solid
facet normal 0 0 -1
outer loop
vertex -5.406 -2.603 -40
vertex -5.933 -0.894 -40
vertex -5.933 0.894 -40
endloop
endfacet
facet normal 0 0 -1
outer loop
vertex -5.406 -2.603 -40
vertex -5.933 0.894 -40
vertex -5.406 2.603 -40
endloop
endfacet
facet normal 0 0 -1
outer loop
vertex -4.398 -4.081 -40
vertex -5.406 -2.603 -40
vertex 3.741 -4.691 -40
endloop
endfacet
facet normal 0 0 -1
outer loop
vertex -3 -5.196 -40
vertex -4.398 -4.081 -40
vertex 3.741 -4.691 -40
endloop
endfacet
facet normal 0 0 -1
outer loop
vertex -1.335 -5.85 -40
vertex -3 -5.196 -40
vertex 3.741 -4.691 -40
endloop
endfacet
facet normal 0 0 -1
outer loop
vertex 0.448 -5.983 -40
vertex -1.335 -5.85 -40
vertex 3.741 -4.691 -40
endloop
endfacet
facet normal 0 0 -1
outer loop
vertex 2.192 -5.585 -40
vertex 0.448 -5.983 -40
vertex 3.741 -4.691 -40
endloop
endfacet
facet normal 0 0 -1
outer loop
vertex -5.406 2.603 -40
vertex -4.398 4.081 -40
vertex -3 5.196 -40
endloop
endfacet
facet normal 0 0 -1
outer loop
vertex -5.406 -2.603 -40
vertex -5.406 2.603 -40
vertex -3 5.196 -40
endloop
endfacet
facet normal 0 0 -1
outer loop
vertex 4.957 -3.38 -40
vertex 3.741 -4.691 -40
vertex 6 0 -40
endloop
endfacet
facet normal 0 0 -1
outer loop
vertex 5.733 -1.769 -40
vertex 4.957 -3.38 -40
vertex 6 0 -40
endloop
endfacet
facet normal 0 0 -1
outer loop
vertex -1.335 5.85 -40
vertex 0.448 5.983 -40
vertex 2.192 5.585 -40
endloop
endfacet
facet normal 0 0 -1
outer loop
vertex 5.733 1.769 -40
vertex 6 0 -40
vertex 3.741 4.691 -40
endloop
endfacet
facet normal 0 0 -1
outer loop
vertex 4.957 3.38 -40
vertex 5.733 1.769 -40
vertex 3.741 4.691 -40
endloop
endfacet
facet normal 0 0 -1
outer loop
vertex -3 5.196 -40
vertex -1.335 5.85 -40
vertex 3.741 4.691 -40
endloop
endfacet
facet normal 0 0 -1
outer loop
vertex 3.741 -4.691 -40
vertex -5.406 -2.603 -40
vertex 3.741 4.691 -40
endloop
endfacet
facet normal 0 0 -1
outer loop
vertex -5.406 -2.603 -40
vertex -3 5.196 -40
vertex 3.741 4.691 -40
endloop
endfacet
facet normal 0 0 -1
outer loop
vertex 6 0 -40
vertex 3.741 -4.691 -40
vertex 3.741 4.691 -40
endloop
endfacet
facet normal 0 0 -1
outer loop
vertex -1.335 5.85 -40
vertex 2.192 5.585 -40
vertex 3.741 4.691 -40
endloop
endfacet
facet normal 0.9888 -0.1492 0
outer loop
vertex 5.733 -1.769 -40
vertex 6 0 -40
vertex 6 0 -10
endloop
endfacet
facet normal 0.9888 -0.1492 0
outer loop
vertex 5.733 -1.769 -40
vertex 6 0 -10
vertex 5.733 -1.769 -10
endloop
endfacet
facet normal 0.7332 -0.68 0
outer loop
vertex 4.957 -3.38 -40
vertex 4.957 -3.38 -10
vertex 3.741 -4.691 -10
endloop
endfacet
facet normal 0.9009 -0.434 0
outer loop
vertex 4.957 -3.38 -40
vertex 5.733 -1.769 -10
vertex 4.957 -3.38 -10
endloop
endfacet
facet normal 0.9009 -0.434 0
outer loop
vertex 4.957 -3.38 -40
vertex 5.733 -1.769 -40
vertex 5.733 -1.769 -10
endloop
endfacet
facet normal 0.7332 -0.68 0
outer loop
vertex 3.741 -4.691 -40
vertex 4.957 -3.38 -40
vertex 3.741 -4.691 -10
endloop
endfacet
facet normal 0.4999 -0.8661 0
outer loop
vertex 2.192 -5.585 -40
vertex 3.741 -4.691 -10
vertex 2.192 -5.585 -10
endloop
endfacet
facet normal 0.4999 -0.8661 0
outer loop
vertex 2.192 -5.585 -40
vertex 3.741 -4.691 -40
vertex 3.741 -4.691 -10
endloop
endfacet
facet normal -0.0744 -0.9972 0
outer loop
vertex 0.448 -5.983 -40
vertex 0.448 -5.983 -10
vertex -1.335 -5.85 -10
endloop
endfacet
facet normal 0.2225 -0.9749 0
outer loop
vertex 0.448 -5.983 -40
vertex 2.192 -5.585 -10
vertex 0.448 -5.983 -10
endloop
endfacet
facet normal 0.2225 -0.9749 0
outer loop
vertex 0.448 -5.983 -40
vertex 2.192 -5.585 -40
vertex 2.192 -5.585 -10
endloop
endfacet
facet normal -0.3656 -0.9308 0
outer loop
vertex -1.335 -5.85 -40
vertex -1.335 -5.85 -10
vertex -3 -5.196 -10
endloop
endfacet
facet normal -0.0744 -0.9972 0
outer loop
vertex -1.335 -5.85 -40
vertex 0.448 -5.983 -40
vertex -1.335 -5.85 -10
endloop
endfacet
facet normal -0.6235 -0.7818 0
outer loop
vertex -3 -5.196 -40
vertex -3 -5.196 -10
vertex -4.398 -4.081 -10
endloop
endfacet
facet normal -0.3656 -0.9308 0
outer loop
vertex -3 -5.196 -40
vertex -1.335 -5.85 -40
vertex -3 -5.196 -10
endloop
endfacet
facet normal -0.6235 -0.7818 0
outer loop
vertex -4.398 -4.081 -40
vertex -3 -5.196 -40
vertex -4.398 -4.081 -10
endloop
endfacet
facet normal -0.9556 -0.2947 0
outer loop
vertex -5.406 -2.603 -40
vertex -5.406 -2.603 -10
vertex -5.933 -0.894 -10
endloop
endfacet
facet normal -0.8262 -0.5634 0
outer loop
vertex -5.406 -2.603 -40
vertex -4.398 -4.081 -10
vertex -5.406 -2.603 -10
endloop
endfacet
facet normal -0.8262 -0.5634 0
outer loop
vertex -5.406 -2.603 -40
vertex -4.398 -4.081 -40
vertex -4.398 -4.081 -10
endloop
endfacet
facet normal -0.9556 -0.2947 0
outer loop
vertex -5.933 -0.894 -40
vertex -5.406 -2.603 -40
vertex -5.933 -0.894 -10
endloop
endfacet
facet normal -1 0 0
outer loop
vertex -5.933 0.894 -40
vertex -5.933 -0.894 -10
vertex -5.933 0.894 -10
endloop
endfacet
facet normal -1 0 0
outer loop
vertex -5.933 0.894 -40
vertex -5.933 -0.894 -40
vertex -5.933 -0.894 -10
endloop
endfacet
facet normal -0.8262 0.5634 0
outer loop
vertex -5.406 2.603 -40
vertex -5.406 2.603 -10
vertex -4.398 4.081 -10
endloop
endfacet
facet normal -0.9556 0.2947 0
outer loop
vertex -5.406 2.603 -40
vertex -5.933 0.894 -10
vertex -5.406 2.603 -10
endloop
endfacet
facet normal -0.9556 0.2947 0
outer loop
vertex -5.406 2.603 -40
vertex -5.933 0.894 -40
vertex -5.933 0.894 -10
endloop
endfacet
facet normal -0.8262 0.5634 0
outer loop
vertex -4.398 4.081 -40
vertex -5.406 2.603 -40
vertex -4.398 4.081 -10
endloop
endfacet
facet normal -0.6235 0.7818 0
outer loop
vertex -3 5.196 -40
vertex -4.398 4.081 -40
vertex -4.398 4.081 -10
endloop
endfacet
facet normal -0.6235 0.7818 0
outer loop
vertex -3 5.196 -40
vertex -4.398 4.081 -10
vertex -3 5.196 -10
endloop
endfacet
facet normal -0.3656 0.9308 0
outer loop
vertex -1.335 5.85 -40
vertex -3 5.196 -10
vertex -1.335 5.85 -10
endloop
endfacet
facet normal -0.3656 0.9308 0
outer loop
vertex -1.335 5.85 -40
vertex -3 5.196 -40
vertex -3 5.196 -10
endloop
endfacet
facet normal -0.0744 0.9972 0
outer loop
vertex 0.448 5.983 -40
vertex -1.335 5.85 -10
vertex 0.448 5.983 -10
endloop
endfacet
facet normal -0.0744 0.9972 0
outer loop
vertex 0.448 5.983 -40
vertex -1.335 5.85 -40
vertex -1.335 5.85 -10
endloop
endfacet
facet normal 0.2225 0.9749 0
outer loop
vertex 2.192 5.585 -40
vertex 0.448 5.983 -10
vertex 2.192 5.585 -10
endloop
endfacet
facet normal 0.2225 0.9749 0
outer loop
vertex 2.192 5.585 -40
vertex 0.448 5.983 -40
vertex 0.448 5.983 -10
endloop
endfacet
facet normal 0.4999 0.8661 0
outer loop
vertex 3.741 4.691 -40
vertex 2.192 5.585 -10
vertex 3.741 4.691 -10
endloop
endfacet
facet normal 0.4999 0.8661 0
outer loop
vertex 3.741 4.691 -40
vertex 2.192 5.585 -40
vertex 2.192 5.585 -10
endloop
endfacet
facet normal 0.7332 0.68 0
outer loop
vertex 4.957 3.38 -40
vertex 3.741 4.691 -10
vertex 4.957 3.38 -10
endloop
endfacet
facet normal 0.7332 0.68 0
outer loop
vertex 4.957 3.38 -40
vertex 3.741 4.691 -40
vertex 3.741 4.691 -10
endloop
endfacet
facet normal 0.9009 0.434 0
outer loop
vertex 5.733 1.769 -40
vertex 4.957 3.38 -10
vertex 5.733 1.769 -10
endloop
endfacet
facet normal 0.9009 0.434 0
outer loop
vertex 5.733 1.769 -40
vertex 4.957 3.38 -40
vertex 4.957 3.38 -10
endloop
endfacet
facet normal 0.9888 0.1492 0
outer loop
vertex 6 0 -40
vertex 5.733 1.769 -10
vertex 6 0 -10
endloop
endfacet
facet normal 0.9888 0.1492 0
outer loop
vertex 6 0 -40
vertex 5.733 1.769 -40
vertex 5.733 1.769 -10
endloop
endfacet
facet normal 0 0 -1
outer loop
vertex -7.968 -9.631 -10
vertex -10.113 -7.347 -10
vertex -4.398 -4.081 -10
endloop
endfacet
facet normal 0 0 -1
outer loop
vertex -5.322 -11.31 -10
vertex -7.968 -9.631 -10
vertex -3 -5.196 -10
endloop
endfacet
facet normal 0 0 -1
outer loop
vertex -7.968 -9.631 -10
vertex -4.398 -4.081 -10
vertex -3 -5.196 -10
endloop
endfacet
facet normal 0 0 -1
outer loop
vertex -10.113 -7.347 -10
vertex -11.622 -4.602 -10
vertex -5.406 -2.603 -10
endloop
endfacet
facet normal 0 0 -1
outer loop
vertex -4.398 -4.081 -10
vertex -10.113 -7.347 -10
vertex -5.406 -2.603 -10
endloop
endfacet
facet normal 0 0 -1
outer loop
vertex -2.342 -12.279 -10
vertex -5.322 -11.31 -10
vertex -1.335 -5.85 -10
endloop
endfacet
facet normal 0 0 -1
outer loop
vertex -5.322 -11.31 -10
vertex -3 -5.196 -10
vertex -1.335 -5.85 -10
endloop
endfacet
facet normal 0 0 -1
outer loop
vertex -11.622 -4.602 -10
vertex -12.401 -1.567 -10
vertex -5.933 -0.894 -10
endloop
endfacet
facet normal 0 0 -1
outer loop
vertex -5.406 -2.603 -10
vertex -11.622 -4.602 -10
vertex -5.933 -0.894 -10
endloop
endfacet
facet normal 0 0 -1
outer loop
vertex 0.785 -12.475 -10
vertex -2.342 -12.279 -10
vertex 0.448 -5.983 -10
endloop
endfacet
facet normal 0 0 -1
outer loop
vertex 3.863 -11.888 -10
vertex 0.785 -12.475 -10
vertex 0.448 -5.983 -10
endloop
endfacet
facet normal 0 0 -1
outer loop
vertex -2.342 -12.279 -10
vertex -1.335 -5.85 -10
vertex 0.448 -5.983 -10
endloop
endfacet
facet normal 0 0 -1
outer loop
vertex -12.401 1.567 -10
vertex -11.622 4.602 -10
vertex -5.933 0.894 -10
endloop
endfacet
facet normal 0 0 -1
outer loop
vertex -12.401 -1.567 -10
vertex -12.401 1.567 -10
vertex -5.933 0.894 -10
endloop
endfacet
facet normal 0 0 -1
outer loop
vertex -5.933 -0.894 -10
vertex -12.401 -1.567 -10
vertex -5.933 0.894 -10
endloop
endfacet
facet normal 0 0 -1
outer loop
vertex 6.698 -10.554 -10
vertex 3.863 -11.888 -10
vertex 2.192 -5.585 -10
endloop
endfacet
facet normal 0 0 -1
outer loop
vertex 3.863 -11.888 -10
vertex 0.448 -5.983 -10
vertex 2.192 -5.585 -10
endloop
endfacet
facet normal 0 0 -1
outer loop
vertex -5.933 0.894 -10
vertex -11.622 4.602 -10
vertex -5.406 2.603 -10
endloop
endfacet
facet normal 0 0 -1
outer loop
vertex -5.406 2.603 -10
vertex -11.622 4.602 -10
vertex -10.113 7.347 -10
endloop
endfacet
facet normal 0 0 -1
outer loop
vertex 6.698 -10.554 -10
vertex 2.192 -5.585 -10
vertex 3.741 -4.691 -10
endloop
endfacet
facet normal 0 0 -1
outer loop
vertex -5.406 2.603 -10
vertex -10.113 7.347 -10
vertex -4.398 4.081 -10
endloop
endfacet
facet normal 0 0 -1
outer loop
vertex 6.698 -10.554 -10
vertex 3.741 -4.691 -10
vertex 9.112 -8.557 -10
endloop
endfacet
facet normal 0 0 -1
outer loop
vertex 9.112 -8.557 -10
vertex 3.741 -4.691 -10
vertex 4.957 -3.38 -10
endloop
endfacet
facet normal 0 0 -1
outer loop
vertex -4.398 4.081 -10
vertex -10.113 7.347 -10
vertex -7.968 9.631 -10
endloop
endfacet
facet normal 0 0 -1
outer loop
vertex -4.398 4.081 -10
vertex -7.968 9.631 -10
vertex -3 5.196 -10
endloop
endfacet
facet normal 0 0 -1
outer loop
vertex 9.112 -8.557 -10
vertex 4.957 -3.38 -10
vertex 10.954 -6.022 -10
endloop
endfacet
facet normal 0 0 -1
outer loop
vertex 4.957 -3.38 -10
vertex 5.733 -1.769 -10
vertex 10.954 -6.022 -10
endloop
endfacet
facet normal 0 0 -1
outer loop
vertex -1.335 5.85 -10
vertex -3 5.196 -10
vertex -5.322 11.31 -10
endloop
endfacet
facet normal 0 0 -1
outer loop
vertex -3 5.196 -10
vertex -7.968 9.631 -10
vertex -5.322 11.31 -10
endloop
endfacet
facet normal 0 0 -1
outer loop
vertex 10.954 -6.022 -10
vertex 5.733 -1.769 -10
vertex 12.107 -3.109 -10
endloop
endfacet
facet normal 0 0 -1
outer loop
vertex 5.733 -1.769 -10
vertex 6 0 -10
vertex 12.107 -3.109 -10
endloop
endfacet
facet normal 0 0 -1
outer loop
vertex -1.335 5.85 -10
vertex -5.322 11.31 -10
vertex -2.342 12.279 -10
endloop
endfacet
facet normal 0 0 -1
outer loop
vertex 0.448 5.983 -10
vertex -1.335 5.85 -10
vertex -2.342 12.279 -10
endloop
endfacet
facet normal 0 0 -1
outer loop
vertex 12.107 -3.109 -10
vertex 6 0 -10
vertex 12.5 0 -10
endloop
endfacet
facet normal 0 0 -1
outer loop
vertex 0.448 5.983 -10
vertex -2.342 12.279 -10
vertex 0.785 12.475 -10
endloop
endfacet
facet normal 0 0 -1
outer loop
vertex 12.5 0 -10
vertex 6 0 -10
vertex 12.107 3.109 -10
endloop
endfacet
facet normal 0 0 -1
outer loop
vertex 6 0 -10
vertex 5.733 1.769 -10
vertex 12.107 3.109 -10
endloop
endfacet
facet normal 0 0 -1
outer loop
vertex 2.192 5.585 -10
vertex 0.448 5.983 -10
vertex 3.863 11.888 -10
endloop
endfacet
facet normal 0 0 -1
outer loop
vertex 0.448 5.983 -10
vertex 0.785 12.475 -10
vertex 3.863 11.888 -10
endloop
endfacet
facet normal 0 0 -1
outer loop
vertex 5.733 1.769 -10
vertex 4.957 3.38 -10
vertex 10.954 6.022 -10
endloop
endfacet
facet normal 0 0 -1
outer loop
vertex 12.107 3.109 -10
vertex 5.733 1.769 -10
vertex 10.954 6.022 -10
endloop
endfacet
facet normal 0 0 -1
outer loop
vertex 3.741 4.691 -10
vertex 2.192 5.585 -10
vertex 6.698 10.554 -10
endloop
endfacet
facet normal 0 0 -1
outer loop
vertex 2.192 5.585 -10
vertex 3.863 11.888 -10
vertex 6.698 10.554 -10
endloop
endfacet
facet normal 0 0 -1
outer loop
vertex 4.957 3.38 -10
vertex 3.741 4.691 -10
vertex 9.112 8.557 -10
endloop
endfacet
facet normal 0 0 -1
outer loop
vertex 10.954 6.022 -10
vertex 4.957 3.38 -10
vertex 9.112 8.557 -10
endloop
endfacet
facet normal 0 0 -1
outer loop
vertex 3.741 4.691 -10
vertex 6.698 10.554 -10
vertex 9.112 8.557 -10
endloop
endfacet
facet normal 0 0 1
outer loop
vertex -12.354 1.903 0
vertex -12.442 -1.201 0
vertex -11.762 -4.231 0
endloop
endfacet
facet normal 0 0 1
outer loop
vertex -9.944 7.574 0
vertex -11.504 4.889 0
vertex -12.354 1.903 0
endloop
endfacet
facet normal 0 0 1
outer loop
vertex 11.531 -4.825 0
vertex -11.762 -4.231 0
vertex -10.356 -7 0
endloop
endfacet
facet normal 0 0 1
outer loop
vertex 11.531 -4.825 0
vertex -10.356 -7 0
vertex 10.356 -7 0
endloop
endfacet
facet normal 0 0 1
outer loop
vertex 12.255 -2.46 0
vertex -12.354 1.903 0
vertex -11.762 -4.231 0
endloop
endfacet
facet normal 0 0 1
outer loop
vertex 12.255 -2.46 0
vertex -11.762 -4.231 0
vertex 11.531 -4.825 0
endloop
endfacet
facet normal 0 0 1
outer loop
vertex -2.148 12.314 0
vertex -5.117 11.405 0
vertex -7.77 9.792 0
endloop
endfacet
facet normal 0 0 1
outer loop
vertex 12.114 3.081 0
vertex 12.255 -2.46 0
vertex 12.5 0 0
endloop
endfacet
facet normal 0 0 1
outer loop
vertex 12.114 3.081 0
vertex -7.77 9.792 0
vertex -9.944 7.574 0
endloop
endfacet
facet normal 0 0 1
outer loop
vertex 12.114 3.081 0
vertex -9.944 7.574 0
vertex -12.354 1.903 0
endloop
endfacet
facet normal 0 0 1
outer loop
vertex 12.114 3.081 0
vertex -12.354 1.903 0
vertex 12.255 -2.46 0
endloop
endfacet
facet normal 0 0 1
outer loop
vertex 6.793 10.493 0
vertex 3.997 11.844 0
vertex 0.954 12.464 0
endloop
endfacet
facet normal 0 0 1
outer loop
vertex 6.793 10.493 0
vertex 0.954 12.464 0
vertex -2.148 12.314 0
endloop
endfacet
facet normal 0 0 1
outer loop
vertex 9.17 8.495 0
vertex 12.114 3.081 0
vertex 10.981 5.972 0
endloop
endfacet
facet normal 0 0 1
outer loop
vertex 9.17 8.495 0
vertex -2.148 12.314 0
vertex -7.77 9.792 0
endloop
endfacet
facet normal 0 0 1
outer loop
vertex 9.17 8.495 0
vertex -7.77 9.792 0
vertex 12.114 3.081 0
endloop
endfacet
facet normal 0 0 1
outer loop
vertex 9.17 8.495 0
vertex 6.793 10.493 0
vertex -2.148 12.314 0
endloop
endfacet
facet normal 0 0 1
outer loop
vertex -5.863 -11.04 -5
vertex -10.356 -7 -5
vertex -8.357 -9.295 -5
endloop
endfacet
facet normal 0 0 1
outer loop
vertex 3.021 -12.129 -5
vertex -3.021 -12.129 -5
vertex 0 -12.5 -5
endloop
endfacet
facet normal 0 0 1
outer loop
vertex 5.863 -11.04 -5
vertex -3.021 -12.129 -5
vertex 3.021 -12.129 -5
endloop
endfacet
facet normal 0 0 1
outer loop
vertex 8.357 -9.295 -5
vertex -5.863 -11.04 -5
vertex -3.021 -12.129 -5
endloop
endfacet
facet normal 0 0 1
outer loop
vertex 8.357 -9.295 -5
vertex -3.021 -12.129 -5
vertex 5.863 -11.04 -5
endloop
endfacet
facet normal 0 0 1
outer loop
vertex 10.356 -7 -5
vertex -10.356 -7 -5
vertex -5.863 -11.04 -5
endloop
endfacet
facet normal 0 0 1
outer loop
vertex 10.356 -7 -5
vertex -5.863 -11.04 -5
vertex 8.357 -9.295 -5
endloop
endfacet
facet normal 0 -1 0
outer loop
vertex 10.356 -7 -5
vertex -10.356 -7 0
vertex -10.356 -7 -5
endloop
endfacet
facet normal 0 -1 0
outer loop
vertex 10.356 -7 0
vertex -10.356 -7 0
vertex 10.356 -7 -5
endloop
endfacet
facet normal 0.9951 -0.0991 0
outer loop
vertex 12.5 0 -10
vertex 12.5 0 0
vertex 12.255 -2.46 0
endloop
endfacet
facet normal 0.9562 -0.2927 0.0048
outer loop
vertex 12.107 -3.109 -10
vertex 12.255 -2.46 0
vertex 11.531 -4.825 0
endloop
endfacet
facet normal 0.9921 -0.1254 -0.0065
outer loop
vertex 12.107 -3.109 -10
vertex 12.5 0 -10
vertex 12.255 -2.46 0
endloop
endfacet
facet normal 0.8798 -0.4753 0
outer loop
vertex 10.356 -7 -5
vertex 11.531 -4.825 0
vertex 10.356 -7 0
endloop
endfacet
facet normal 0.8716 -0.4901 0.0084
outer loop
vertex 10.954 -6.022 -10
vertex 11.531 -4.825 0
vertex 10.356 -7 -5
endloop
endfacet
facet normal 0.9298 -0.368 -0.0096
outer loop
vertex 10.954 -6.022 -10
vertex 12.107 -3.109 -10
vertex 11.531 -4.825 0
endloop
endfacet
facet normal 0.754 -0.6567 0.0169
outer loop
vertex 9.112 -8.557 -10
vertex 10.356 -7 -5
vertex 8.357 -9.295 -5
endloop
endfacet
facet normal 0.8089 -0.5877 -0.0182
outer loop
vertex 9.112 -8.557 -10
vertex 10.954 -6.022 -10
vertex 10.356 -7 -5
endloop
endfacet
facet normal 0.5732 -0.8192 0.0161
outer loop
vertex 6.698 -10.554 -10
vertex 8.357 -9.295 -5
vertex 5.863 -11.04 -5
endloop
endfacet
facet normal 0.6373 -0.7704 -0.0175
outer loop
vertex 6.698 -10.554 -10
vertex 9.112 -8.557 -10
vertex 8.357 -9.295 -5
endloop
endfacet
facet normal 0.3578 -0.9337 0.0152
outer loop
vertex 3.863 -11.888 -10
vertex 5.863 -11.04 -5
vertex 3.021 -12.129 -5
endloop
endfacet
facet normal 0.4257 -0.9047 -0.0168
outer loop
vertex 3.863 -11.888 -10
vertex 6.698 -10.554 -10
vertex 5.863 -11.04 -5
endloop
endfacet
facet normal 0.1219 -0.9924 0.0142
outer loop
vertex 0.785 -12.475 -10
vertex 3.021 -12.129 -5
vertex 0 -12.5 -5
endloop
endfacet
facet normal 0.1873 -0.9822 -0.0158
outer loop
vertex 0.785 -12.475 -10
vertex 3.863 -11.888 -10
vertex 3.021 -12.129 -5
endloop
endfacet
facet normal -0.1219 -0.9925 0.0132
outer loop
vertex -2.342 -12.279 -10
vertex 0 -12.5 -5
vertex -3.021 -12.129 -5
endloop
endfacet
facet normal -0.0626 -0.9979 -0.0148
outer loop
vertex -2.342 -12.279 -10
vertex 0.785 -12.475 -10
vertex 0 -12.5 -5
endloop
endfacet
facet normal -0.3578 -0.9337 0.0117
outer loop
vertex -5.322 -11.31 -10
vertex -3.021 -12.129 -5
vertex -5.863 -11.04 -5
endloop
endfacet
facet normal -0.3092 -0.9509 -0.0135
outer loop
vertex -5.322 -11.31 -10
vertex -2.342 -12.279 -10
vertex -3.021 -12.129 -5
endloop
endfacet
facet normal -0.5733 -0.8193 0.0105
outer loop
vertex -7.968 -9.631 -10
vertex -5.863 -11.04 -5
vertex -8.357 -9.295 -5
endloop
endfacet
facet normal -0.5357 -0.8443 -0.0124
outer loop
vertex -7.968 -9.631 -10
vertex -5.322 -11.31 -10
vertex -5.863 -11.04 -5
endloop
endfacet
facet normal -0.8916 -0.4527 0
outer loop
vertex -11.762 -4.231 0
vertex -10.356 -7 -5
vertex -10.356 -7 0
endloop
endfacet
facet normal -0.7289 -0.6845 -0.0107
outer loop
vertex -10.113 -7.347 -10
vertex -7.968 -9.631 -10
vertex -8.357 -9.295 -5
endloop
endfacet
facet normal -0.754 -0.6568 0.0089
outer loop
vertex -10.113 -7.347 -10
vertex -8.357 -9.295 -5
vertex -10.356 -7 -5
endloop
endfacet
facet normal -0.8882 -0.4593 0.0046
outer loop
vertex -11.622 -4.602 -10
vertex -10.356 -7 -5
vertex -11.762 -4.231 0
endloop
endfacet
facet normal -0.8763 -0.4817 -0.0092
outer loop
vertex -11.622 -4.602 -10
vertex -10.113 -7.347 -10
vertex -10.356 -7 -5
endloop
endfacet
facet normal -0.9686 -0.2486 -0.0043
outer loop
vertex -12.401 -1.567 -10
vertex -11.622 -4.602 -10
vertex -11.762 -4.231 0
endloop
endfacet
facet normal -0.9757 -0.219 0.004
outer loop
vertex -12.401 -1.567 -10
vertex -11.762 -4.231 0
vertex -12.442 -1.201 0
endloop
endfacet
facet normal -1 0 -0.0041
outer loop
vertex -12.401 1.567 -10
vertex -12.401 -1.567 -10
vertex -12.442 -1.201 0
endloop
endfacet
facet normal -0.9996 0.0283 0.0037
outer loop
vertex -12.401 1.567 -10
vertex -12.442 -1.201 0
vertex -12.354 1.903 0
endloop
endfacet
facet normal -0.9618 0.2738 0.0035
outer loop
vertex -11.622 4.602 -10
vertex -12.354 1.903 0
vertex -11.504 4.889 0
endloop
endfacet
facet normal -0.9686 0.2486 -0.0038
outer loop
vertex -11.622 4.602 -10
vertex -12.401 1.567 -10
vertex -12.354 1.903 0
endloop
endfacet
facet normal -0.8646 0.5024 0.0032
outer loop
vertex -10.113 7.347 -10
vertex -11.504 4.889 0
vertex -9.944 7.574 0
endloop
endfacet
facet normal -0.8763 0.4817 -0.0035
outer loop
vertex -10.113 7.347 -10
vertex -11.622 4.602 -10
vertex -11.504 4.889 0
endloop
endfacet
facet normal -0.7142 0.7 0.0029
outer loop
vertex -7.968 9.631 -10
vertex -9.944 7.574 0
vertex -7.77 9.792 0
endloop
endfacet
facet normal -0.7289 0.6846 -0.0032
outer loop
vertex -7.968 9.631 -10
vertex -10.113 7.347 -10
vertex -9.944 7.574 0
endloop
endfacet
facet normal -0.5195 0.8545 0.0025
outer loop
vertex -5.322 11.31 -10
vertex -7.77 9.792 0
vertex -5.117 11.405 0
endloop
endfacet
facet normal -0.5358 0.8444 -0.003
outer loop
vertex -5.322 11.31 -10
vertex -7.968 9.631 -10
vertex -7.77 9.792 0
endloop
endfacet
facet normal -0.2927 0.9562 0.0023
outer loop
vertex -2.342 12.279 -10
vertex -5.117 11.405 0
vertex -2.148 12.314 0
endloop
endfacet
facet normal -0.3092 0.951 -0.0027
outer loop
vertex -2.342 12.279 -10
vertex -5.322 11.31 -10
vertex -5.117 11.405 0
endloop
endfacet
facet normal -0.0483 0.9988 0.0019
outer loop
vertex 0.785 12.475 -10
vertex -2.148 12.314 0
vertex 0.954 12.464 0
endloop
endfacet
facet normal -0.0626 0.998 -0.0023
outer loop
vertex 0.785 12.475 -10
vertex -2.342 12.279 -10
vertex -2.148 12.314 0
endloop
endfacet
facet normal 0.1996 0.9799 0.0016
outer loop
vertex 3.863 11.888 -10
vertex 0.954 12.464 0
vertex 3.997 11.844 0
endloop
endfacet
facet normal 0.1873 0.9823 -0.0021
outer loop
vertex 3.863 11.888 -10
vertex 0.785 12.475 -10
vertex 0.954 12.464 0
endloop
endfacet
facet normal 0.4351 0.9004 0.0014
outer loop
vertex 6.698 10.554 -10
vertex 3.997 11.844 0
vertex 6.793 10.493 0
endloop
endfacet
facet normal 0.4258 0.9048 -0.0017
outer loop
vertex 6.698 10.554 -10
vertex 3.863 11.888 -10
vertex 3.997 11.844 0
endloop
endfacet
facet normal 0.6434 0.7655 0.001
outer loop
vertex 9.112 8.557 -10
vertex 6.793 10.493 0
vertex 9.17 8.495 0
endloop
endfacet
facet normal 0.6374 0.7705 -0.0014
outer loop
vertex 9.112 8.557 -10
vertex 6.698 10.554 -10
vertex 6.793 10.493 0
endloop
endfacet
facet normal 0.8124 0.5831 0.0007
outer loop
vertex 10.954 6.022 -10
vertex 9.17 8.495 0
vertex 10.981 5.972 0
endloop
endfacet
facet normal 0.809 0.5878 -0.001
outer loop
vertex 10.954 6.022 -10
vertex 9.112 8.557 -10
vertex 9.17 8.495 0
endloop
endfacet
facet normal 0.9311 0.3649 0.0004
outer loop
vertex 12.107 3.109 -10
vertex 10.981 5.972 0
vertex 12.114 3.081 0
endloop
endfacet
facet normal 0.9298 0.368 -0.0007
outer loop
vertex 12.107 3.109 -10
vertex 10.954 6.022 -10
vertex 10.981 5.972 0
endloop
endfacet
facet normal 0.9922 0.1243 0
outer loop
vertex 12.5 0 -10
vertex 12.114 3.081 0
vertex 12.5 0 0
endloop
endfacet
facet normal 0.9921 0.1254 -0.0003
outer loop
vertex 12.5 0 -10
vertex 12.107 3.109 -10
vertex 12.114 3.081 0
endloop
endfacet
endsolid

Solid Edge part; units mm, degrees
sketch "Sketch1" plane through (0, 0, 0) normal (0, -1, 0) x (1, 0, 0)
  line L0 (0, 0) -> (12.5, 0)
  line L1 (12.5, 0) -> (12.5, -10)
  line L2 (12.5, -10) -> (6, -10)
  line L3 (6, -10) -> (6, -40)
  line L4 (6, -40) -> (0, -40)
  dimension "D1" = 40
  dimension "D2" = 10
revolve "RevolvedProtrusion1" add sketch "Sketch1" angle 360 about axis through (0, 0, -20) along (0, 0, 1)
sketch "Sketch2" plane through (0, 0, 0) normal (0, 0, 1) x (1, 0, 0)
  line L0 (-10.3562, -7) -> (10.3562, -7)
  dimension "D1" = 7
extrude "Cutout1" cut sketch "Sketch2" against normal blind 5 material side at (0, -7.05, 0)
